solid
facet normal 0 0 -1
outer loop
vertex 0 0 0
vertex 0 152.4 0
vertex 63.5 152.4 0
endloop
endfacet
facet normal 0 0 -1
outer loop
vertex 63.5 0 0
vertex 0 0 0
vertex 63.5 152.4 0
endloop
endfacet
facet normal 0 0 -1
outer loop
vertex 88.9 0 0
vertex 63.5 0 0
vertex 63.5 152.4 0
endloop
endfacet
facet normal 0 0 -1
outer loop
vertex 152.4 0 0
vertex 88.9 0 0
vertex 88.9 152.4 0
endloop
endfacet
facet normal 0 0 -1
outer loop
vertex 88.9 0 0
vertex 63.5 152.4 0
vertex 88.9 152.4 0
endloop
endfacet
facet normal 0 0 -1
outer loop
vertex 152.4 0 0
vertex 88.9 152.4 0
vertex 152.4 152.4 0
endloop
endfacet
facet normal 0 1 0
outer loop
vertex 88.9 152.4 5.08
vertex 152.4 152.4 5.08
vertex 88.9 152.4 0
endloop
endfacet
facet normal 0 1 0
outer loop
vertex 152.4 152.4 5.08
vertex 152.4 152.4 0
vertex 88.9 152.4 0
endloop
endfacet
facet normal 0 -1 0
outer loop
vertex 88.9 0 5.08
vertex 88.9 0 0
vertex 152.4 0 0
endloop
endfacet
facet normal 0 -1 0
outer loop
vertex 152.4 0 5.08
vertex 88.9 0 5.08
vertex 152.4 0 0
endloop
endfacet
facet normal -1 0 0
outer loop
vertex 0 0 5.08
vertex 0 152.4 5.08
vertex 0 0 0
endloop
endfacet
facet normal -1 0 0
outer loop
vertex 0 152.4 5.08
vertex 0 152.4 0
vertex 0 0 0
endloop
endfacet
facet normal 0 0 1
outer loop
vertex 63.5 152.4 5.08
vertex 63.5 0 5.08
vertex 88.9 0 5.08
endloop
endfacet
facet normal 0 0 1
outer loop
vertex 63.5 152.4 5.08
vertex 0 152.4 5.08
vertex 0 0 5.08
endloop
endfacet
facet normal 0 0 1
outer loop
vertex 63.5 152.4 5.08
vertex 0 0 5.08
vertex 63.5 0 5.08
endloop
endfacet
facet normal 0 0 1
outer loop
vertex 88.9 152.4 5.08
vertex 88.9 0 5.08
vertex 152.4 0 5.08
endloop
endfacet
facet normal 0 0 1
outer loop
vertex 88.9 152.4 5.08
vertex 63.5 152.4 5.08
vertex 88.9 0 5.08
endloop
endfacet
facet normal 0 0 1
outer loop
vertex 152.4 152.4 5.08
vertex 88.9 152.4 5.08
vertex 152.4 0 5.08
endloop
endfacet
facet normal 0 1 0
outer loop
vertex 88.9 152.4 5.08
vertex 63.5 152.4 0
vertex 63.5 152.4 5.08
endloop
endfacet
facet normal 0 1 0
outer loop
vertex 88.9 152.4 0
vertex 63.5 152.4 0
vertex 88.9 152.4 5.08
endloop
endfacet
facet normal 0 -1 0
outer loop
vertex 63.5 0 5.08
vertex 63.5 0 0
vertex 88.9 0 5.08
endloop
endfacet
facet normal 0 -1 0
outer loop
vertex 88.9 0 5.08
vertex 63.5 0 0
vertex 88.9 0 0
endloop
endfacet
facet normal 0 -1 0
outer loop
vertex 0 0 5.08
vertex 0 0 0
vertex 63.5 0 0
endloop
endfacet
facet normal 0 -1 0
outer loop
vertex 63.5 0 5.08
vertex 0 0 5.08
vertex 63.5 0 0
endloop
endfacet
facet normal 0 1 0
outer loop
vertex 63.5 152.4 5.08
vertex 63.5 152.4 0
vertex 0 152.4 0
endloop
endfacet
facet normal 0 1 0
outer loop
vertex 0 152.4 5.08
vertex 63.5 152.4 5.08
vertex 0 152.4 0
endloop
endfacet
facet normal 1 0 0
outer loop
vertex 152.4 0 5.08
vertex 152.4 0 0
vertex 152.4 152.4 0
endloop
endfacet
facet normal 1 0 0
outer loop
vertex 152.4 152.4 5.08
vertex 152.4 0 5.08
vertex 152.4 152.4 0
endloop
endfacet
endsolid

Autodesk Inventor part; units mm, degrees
ref_plane "YZ Plane" through (0, 0, 0) normal (1, 0, 0) x (0, 1, 0)
ref_plane "XZ Plane" through (0, 0, 0) normal (0, 1, 0) x (-1, 0, 0)
ref_plane "XY Plane" through (0, 0, 0) normal (0, 0, 1) x (1, 0, 0)
sketch "Sketch1" plane through (0, 0, 0) normal (0, 0, 1) x (1, 0, 0)
  line L0 (0, 0) -> (152.4, 0)
  line L1 (152.4, 0) -> (152.4, 152.4)
  line L2 (0, 152.4) -> (0, 0)
  line L3 (152.4, 152.4) -> (88.9, 152.4)
  line L4 (63.5, 152.4) -> (0, 152.4)
  line L5 (63.5, 0) -> (88.9, 0)
  line L6 (63.5, 152.4) -> (88.9, 152.4)
  line L7 (0, 152.4) -> (0, 0)
  line L8 (152.4, 0) -> (0, 0)
extrude "Extrusion1" add sketch "Sketch1" along normal blind 5.08
properties part number "air layer"
